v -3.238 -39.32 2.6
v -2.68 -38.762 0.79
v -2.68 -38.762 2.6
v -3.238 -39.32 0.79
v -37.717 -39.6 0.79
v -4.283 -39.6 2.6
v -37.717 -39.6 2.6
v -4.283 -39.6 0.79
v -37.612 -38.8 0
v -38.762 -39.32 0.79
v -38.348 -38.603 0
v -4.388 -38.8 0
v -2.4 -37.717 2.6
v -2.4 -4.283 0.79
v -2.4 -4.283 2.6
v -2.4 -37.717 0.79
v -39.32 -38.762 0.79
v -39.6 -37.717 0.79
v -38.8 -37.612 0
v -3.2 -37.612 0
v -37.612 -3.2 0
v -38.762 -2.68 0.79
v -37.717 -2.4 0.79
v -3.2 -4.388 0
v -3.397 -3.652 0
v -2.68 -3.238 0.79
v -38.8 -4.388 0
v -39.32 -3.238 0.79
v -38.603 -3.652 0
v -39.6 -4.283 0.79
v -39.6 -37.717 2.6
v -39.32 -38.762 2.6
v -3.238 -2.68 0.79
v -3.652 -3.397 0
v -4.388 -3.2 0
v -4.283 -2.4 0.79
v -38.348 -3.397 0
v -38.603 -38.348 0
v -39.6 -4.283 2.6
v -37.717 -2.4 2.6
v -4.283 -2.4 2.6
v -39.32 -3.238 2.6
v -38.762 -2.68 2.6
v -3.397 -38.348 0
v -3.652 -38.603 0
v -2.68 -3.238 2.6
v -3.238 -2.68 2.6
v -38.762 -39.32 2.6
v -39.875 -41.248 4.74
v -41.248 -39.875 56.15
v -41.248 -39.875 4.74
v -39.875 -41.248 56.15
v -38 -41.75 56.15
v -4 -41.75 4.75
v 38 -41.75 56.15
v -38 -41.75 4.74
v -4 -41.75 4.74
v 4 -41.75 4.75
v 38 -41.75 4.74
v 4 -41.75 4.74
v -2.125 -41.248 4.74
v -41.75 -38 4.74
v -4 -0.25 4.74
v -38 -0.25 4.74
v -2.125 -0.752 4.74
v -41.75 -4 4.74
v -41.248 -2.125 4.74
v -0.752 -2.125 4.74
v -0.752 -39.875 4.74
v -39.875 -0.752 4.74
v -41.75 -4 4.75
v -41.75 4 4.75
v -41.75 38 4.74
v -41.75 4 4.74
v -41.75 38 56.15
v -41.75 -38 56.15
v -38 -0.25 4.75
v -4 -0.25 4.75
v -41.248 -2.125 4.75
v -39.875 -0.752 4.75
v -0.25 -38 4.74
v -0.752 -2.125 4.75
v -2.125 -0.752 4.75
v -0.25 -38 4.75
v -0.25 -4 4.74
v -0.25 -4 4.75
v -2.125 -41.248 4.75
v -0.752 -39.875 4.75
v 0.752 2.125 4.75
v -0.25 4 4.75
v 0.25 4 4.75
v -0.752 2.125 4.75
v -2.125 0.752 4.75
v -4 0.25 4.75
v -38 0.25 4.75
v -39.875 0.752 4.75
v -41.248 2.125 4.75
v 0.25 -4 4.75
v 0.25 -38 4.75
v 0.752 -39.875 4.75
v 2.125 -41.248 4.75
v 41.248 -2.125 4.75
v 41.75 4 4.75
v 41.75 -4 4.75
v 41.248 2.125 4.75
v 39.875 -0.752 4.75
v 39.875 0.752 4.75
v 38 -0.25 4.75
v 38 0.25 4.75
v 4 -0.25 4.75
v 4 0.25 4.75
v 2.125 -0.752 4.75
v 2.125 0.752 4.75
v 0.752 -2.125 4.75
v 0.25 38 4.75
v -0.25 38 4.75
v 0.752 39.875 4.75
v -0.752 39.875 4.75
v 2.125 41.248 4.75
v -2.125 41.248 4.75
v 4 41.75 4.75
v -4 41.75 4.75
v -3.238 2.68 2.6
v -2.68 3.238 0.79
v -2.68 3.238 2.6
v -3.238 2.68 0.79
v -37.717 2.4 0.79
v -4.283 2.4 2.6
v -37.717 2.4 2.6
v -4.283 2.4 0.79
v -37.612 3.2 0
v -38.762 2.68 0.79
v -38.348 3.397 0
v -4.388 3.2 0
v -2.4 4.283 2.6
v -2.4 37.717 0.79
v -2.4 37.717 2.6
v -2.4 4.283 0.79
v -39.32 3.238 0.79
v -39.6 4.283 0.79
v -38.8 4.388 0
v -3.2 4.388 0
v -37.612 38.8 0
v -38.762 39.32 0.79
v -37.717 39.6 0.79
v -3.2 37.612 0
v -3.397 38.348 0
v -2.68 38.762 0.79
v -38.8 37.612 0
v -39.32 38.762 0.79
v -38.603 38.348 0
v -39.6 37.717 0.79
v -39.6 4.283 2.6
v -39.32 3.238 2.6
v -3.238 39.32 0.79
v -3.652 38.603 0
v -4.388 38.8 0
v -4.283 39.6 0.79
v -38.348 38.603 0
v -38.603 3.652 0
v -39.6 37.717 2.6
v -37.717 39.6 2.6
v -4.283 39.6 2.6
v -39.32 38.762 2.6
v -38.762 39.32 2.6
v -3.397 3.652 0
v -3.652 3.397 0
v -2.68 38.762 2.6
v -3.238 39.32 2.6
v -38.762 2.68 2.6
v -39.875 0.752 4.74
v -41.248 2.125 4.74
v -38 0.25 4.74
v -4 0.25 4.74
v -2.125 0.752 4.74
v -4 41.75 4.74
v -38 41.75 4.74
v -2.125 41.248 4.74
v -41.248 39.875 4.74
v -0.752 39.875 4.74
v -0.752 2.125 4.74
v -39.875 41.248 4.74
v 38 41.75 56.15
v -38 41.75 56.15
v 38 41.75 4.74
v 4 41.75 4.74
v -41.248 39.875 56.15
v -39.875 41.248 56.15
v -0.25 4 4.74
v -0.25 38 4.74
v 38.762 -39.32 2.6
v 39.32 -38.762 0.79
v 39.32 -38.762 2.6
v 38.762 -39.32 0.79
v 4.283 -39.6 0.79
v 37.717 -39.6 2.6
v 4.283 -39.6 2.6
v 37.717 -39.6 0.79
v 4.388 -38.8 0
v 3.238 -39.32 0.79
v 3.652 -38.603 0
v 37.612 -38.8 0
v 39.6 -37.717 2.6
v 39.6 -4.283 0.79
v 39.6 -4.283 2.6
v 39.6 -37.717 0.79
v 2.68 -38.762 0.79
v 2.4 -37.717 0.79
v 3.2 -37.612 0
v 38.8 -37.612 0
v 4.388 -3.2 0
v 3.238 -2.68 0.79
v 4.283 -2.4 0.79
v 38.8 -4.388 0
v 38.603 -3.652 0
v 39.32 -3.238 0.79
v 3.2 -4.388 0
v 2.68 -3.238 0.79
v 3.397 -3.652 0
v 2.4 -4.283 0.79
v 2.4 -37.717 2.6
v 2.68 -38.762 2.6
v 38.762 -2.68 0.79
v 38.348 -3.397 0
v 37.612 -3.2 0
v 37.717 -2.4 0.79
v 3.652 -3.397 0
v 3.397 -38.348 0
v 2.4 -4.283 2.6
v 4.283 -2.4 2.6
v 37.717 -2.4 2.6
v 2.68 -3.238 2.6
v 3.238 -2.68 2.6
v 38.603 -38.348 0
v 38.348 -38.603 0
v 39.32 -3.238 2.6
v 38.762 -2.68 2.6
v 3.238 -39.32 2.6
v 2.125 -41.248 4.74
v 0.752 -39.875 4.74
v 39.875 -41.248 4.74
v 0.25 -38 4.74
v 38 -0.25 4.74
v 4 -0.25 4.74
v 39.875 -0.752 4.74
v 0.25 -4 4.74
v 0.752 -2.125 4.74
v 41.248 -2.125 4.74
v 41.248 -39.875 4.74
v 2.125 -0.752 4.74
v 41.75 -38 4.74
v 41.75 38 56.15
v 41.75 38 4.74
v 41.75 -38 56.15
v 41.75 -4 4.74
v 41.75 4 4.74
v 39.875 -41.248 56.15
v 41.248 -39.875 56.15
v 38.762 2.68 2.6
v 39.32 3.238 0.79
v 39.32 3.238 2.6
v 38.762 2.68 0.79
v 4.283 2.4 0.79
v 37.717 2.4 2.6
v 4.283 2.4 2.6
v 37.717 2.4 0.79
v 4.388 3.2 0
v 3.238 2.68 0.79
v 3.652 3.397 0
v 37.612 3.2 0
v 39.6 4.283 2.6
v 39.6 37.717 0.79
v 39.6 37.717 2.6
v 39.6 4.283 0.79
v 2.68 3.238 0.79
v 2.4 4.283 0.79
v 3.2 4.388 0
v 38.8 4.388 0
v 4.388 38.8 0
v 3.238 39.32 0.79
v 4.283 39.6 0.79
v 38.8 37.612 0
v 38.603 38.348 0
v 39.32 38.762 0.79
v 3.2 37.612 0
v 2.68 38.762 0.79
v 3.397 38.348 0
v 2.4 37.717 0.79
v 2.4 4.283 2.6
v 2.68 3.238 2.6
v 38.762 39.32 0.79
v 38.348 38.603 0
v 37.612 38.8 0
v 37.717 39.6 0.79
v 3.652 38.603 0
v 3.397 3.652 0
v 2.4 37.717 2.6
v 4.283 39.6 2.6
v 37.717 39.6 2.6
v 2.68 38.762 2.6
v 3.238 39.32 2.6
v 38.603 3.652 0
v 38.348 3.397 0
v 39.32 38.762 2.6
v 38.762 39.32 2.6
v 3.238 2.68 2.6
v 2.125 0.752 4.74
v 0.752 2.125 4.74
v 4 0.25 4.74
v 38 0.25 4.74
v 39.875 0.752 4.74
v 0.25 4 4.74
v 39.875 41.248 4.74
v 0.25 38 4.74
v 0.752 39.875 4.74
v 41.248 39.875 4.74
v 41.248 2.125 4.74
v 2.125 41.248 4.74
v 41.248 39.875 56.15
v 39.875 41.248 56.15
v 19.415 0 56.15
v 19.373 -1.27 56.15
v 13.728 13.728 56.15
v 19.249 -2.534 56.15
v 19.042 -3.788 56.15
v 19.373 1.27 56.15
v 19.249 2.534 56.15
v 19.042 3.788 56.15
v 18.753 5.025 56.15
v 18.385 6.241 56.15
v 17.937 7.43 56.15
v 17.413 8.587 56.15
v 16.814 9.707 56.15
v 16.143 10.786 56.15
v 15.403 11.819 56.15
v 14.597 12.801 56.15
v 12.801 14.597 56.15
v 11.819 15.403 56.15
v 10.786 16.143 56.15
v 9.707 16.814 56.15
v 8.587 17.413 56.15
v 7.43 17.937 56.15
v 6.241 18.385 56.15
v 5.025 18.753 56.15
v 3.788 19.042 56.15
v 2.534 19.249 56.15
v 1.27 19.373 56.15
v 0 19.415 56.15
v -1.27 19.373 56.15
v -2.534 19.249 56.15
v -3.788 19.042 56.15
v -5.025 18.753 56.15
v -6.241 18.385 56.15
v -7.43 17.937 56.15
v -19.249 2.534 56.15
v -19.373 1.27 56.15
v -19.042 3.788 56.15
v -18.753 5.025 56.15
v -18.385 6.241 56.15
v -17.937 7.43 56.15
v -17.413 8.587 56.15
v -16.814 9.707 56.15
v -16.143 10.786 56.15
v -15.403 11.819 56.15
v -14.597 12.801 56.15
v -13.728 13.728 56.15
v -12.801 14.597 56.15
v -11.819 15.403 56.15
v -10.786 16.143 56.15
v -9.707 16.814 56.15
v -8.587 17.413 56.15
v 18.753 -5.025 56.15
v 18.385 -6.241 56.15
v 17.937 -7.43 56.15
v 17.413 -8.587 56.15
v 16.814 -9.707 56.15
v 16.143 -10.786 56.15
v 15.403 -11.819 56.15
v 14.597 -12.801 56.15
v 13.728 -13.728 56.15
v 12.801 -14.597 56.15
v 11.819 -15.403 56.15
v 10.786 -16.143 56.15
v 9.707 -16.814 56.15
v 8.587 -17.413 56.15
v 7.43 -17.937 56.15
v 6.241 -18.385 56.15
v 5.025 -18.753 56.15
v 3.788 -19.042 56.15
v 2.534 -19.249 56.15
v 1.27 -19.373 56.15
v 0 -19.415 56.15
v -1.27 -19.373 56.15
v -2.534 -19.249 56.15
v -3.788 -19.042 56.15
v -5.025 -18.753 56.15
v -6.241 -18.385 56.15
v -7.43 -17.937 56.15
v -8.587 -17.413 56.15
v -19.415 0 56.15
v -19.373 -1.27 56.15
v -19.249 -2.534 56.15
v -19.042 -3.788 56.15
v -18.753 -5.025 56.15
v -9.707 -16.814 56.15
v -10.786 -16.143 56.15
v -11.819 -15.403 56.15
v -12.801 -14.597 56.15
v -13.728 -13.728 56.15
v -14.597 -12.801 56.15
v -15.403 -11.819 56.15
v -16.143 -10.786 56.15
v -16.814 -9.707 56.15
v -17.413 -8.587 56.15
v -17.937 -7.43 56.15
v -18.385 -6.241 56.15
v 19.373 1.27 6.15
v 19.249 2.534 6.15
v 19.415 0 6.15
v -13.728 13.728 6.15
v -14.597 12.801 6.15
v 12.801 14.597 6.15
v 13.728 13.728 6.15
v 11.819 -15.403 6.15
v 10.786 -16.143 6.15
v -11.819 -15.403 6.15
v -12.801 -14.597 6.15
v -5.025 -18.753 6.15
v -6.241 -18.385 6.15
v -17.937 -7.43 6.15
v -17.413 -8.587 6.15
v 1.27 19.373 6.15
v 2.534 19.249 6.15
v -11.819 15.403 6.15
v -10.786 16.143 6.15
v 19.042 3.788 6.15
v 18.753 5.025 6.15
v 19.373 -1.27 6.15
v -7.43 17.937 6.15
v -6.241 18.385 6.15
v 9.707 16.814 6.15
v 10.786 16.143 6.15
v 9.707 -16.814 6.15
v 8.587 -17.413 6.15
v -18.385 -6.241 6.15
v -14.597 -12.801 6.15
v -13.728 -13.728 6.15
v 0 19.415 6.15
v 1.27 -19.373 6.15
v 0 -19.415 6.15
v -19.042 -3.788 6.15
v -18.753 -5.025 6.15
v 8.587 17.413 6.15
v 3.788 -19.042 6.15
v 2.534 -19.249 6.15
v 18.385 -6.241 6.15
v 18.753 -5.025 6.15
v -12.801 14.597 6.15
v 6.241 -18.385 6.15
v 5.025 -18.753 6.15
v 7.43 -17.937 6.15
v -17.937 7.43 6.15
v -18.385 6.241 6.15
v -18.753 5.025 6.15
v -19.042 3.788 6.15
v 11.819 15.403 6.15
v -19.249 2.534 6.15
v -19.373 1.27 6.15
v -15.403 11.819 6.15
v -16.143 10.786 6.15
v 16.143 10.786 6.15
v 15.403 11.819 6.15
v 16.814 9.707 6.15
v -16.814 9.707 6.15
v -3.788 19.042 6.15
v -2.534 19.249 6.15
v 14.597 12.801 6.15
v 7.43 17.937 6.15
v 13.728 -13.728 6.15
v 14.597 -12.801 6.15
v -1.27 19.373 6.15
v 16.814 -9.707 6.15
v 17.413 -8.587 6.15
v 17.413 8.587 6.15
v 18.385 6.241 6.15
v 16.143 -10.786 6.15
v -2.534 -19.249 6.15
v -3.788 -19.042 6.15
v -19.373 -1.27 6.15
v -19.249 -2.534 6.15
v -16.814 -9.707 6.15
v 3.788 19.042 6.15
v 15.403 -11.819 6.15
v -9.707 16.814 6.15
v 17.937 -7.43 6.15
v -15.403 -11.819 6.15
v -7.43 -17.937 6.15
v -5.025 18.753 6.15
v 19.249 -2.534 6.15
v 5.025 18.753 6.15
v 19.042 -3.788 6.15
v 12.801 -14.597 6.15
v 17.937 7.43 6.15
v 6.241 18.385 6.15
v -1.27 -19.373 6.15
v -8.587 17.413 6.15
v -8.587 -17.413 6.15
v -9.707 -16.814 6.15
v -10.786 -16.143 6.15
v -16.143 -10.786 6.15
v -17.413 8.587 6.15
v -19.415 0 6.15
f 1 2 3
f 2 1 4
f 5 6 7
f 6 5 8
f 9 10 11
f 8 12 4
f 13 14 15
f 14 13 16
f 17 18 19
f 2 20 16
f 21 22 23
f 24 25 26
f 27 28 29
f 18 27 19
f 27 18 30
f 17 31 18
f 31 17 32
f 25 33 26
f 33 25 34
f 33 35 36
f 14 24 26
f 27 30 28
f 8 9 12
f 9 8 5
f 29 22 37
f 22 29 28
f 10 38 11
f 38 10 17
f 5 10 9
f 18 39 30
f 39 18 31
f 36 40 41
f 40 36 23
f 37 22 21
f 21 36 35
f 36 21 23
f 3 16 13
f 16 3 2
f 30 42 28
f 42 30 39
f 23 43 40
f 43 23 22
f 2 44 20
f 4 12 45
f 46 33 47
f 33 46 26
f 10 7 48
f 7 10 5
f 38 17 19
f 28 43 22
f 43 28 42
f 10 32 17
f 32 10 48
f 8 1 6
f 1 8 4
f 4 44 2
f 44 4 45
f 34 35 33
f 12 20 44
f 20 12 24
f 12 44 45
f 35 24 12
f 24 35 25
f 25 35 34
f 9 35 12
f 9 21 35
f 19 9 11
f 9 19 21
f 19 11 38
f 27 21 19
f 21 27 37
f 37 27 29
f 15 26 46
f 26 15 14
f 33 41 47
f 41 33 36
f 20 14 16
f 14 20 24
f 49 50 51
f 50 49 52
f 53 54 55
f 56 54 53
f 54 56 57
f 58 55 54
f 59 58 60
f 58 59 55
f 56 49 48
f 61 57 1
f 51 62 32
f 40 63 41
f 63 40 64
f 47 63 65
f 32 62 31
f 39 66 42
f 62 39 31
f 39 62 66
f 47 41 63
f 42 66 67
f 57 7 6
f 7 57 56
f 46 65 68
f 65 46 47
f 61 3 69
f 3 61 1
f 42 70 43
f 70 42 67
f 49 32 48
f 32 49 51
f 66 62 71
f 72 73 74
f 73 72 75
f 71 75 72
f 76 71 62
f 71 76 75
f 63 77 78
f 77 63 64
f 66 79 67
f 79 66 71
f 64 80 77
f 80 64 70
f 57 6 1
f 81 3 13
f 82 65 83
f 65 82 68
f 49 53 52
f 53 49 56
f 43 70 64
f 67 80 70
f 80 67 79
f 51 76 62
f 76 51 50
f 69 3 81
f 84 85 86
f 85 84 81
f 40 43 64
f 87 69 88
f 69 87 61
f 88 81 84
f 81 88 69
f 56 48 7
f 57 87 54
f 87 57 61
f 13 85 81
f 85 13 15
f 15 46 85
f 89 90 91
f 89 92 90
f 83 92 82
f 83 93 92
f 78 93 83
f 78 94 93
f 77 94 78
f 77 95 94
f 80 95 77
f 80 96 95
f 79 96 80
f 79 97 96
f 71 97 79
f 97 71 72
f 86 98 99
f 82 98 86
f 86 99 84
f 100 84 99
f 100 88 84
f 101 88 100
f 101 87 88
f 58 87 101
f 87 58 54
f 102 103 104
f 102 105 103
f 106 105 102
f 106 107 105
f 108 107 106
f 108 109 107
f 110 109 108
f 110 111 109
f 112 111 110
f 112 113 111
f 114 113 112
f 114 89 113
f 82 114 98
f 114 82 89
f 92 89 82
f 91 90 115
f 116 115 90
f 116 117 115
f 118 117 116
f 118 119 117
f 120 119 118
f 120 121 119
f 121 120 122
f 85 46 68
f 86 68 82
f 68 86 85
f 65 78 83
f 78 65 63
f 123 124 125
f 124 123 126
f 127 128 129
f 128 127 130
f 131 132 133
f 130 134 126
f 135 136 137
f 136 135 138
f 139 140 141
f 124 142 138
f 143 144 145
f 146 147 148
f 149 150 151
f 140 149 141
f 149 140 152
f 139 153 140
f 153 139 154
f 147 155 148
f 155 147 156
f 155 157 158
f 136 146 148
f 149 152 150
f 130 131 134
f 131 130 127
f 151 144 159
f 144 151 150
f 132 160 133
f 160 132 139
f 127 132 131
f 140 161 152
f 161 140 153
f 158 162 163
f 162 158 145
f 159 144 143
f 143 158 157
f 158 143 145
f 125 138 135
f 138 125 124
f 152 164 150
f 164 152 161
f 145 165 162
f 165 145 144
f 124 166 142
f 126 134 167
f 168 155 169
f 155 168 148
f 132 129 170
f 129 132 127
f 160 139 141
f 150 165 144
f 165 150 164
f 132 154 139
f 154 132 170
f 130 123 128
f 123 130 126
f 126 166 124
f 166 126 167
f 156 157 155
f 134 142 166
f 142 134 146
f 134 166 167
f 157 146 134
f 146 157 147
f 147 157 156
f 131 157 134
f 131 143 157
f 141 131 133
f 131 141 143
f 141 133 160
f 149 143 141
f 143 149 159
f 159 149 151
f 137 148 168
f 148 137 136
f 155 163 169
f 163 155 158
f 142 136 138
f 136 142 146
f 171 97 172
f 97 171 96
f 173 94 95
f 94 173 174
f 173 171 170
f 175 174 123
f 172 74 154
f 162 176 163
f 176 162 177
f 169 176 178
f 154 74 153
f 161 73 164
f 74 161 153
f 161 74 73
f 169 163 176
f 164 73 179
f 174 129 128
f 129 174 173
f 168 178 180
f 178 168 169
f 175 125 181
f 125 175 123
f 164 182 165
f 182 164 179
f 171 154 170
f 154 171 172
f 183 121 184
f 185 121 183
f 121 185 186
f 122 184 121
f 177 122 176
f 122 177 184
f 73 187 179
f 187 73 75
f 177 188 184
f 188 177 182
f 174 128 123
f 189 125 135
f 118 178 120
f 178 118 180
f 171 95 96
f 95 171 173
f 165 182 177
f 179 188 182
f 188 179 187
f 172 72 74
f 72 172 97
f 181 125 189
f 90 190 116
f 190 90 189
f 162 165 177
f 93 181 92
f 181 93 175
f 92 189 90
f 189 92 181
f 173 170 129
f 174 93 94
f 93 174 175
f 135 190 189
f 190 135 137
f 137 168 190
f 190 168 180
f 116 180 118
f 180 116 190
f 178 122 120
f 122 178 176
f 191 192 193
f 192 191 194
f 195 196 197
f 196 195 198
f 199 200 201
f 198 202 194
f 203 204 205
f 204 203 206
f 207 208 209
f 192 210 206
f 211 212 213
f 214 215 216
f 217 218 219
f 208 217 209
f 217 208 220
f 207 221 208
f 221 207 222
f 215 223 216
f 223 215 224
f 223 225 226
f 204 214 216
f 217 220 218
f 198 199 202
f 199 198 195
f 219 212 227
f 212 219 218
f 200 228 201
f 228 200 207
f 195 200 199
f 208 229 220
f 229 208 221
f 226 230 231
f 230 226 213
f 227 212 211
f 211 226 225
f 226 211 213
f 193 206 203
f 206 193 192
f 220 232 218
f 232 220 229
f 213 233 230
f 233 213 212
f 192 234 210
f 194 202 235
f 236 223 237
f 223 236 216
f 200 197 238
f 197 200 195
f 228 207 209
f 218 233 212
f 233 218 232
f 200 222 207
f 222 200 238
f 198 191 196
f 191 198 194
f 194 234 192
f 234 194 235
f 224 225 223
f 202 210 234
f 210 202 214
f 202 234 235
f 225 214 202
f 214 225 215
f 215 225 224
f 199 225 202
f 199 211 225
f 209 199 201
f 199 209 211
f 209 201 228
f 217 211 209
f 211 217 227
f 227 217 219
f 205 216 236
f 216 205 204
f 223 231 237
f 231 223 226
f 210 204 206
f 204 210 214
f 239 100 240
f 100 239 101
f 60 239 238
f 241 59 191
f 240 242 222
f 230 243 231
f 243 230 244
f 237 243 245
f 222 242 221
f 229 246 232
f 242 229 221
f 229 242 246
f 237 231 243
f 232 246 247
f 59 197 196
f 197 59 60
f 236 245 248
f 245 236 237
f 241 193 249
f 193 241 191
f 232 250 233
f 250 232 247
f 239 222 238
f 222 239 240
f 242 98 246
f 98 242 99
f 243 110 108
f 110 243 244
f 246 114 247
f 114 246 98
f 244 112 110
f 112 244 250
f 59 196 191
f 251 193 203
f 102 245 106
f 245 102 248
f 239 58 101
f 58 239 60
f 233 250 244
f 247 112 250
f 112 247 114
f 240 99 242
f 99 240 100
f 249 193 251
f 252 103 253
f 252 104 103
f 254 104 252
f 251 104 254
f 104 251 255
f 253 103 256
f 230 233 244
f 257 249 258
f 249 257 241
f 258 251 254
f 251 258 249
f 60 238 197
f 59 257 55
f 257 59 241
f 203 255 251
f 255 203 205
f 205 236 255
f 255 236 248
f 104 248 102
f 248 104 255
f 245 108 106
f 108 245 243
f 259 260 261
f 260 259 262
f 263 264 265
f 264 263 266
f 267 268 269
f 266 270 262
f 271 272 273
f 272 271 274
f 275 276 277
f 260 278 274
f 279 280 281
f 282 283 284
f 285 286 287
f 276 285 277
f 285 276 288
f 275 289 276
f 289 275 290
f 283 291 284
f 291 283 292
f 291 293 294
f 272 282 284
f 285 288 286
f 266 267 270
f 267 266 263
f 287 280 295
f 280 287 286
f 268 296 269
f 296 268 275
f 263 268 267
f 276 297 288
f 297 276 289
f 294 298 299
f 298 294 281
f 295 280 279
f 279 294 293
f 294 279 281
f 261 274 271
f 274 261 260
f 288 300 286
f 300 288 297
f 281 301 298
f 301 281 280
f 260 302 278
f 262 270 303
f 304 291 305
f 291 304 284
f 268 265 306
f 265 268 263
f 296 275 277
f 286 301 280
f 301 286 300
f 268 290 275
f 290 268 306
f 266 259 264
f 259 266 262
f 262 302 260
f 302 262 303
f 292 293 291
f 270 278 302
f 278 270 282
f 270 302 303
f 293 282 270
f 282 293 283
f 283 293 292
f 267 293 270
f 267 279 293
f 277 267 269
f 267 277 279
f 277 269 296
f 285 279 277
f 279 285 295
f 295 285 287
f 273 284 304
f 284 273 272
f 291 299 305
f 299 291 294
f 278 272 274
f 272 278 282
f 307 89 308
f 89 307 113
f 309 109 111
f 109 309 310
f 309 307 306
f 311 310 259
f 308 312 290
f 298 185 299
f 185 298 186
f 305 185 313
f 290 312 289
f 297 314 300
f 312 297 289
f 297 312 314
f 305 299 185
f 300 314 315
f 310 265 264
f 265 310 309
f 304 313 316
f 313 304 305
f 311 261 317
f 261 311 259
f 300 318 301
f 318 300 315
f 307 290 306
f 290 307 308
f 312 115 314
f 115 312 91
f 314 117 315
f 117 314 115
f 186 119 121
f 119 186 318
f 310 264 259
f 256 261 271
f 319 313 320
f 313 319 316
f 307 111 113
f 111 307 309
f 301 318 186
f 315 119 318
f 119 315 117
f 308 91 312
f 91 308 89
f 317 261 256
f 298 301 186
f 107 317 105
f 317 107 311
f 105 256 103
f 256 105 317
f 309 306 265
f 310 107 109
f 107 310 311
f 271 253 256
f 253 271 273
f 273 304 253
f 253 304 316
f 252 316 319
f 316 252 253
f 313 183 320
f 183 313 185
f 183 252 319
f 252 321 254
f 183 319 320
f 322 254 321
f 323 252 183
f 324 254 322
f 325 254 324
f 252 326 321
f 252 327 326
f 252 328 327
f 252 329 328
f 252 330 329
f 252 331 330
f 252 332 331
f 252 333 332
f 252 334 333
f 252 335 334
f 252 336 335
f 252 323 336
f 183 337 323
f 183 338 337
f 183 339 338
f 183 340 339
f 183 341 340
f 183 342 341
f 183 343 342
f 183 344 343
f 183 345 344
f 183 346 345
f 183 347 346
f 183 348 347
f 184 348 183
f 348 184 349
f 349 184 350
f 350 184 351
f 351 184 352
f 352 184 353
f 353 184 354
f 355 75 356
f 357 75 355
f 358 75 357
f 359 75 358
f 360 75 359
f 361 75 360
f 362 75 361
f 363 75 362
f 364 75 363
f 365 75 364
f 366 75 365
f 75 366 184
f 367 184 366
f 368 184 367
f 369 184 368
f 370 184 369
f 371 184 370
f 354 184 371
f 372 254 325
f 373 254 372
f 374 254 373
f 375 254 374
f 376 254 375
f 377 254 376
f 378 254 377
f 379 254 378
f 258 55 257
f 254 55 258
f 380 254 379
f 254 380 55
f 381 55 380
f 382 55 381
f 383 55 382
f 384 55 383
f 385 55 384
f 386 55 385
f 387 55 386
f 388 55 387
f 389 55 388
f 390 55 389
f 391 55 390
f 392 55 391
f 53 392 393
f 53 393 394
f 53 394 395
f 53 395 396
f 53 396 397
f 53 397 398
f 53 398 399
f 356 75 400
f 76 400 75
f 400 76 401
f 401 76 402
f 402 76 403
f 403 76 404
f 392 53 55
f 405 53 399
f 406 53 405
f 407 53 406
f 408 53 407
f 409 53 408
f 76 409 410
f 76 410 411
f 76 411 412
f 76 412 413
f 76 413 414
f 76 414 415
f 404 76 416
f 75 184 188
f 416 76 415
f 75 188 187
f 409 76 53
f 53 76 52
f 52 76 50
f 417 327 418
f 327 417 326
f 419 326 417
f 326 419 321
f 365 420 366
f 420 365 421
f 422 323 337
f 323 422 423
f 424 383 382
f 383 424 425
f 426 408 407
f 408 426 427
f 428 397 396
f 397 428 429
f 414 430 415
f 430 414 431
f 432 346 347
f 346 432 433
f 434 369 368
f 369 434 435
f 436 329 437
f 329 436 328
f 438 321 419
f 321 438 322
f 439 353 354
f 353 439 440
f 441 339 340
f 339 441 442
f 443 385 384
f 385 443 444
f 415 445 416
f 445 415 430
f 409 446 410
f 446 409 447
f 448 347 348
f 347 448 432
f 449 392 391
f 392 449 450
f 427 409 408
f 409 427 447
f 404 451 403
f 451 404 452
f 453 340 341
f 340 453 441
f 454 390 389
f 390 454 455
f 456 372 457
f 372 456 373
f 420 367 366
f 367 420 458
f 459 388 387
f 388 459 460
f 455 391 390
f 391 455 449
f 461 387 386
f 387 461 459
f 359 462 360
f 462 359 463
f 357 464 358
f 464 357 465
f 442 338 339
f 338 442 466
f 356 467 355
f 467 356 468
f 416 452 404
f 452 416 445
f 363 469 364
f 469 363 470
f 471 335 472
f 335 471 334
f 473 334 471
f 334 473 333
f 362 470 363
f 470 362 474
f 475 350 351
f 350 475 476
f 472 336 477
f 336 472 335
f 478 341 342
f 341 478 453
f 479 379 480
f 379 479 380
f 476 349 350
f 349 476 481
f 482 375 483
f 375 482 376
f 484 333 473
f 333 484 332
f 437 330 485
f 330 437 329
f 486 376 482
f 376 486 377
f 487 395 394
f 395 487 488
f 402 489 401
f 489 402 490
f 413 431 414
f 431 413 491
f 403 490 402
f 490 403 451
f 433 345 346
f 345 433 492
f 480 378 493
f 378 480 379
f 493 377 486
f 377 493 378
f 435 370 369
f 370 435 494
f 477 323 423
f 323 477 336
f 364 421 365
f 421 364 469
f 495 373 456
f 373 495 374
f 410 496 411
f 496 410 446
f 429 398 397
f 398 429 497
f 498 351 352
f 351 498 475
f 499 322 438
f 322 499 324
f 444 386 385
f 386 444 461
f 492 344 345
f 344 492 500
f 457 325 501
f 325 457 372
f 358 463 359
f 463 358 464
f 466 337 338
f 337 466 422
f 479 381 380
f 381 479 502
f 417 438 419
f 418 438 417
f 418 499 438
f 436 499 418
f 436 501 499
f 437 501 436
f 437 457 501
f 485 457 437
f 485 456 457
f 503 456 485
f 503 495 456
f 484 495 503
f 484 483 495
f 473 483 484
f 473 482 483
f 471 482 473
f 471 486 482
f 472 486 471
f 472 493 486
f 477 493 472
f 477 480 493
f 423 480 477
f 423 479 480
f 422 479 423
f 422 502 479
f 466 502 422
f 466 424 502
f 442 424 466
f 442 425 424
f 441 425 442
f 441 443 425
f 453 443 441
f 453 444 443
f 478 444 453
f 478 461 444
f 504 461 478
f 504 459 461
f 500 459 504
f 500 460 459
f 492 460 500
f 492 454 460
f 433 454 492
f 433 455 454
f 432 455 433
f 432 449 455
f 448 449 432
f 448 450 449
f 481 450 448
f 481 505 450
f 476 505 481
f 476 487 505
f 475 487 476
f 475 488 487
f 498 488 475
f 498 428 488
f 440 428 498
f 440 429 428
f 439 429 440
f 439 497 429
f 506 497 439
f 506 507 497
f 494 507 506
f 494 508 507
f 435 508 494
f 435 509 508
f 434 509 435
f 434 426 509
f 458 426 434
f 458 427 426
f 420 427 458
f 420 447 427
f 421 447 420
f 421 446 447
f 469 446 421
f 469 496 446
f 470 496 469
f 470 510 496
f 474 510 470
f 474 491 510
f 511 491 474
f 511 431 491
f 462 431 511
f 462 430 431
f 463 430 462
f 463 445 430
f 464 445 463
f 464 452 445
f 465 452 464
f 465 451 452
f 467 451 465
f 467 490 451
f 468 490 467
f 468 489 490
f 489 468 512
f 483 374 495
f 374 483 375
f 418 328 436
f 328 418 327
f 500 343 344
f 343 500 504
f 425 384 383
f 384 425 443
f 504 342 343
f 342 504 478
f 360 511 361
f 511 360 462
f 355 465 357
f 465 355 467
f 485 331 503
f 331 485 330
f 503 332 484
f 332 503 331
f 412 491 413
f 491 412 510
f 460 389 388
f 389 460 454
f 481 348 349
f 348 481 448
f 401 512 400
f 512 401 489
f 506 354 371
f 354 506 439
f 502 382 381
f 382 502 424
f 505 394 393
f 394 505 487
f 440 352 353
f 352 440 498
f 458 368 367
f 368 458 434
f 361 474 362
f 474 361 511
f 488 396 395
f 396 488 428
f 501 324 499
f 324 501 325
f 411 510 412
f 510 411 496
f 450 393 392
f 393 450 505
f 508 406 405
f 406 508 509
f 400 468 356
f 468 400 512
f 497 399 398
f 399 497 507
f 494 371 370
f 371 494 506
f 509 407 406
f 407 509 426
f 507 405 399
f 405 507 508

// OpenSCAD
// file: ../lib/gridfinity.scad
// gridfinity.scad — shared Gridfinity baseplate + bin library (per spec).
//
// 42 mm pitch, 41.5 mm bins, baseplate socket 0.7/1.8/2.15 = 4.65 mm, 4 mm
// fillet; bin foot 0.8/1.8/2.15 = 4.75 mm, 3.75 mm corner radius. Verified the
// bin foot seats in the baseplate socket with ~0.25–0.5 mm clearance.
//
//   baseplate(nx, ny)                      — tiled receiving baseplate
//   bin_blank(nx, ny, h)                   — solid bin body (feet + block, no cavity)
//   bin(nx, ny, h, wall, floor)            — open Gridfinity bin
//   divided_bin(nx, ny, h, cols, rows, …)  — bin with internal compartments
//   lid(nx, ny, …)                         — friction lid for a bin of the same footprint
//   stack_base(nx, ny, h, …)               — baseplate-topped base; a bin socket-stacks on it

GF = 42; GF_FILLET = 4;
_C_TOP = 2.15; _C_MID = 1.8; _C_BOT = 0.7;
_BP_LIP = _C_TOP + _C_MID + _C_BOT; _BP_FLOOR = 1.2; BP_H = _BP_LIP + _BP_FLOOR;  // 5.85
BIN_SZ = 41.5; BIN_R = 3.75; BIN_BASE_H = 4.75;

// ---- baseplate ----
module _bp_cell(i = 0) { offset(r = -i) offset(r = GF_FILLET) offset(r = -GF_FILLET) square(GF, center = true); }
module _bp_socket() {
    e = 0.01;
    hull() { translate([0,0,BP_H-e]) linear_extrude(e) _bp_cell(0); translate([0,0,BP_H-_C_TOP]) linear_extrude(e) _bp_cell(_C_TOP); }
    translate([0,0,BP_H-_C_TOP-_C_MID]) linear_extrude(_C_MID) _bp_cell(_C_TOP);
    hull() { translate([0,0,BP_H-_C_TOP-_C_MID-e]) linear_extrude(e) _bp_cell(_C_TOP); translate([0,0,BP_H-_BP_LIP]) linear_extrude(e) _bp_cell(_C_TOP+_C_BOT); }
}
module baseplate(nx, ny) {
    w = nx*GF; d = ny*GF;
    difference() {
        translate([0,0,BP_H/2]) linear_extrude(BP_H, center=true) offset(GF_FILLET) offset(-GF_FILLET) square([w,d], center=true);
        for (ix=[0:nx-1], iy=[0:ny-1]) translate([(ix-(nx-1)/2)*GF, (iy-(ny-1)/2)*GF, 0]) _bp_socket();
    }
}

// ---- bin ----
module _bin_cell(i = 0) { offset(r = -i) offset(r = BIN_R) offset(r = -BIN_R) square(BIN_SZ, center = true); }
module _bin_foot() {
    e = 0.01;
    hull() { linear_extrude(e) _bin_cell(2.95); translate([0,0,0.8]) linear_extrude(e) _bin_cell(2.15); }    // bottom chamfer
    translate([0,0,0.8]) linear_extrude(1.8) _bin_cell(2.15);                                                 // vertical
    hull() { translate([0,0,2.6]) linear_extrude(e) _bin_cell(2.15); translate([0,0,BIN_BASE_H]) linear_extrude(e) _bin_cell(0); } // top chamfer
}
// Solid bin body: Gridfinity feet + the block above them, with no cavity cut.
// Cup-style bins (lib/vessel.scad) subtract their own bores from this instead of
// re-deriving the foot + shell union.
module bin_blank(nx, ny, h) {
    W = nx*GF - 0.5; D = ny*GF - 0.5;
    union() {
        for (ix=[0:nx-1], iy=[0:ny-1]) translate([(ix-(nx-1)/2)*GF, (iy-(ny-1)/2)*GF, 0]) _bin_foot();
        translate([0,0,BIN_BASE_H]) linear_extrude(h-BIN_BASE_H) offset(BIN_R) offset(-BIN_R) square([W,D], center=true);
    }
}

module _bin_shell(nx, ny, h, wall, floor) {
    W = nx*GF - 0.5; D = ny*GF - 0.5;
    difference() {
        bin_blank(nx, ny, h);
        translate([0,0,BIN_BASE_H+floor]) linear_extrude(h) offset(BIN_R-wall) offset(-(BIN_R-wall)) square([W-2*wall, D-2*wall], center=true);
    }
}
module bin(nx, ny, h, wall = 1.2, floor = 1.4) { _bin_shell(nx, ny, h, wall, floor); }

// ---- stacking base ----
// A bin whose TOP is a Gridfinity baseplate, so a standard bin socket-stacks on
// it (two-tier towers: instrument on top, cords/jig/adapters in the base). The
// base is open at the FRONT (−Y) by default so the lower item is reachable while
// the top tier stays socketed — same idea as drybox-splitter-stand's open cubby.
// The whole tower foots on the bench baseplate via this base's own foot.
//
//   h = interior height of the lower compartment (floor to the baseplate cap).
module stack_base(nx, ny, h, wall = 1.2, floor = 1.4, open_front = true) {
    W = nx*GF - 0.5; D = ny*GF - 0.5;
    z0 = BIN_BASE_H + floor;
    iw = W - 2*wall; id = D - 2*wall;
    difference() {
        union() {
            bin_blank(nx, ny, h);                    // solid foot + block to h
            translate([0,0,h]) baseplate(nx, ny);    // baseplate cap (sockets up)
        }
        // lower cavity, floor up to the cap underside
        translate([0,0,z0]) linear_extrude(h - z0 + 0.01)
            offset(BIN_R-wall) offset(-(BIN_R-wall)) square([iw, id], center=true);
        // open front: cut the −Y wall so you reach in under the cap
        if (open_front)
            translate([-iw/2, -D, z0]) cube([iw, D/2 + 0.01, h - z0 + 0.01]);
    }
}

module divided_bin(nx, ny, h, cols = 1, rows = 1, wall = 1.2, floor = 1.4, div = 1.2) {
    W = nx*GF - 0.5; D = ny*GF - 0.5;
    union() {
        bin(nx, ny, h, wall, floor);
        // internal divider walls (from the floor up to the rim)
        iw = W - 2*wall; id = D - 2*wall; z0 = BIN_BASE_H + floor;
        for (c = [1 : cols-1]) translate([-iw/2 + c*iw/cols - div/2, -id/2, z0]) cube([div, id, h - z0]);
        for (r = [1 : rows-1]) translate([-iw/2, -id/2 + r*id/rows - div/2, z0]) cube([iw, div, h - z0]);
    }
}

// ---- lid ----
// Friction lid for a bin of the same footprint: a flat plate with a skirt that
// drops into the bin's cavity. Emitted PRINT-READY — plate on the bed, skirt
// standing up — so it needs no supports. Flip it in your head to picture it
// fitted: the plate then caps the rim and the lid adds `t` to the stack height.
//
// Why lids exist here: full-extension drawer slides let small parts hop between
// compartments on a hard close, and brass inserts aren't magnetic — you can't
// sweep them back. `wall` must match the bin's wall so the skirt lands in the
// cavity; `clearance` is per-side slop between skirt and cavity.
module lid(nx, ny, t = 1.6, skirt = 4, wall = 1.2, clearance = 0.35, lid_wall = 1.6) {
    W = nx*GF - 0.5; D = ny*GF - 0.5;
    iw = W - 2*wall - 2*clearance; id = D - 2*wall - 2*clearance;   // skirt outer
    ir = BIN_R - wall;                                              // cavity corner radius
    union() {
        linear_extrude(t) offset(BIN_R) offset(-BIN_R) square([W, D], center=true);
        translate([0,0,t]) linear_extrude(skirt) difference() {
            offset(ir) offset(-ir) square([iw, id], center=true);
            offset(ir-lid_wall) offset(-(ir-lid_wall)) square([iw-2*lid_wall, id-2*lid_wall], center=true);
        }
    }
}
// file: ../lib/vessel.scad
// vessel.scad — parametric collar cups for bottles, cans, and pen-form tools.
//
// A collar cup is a solid Gridfinity block with cylindrical bores sunk into it.
// It LOCATES a vessel; it does not clamp one. That distinction is the whole
// design: a collar that grips harder than the bin weighs comes out of the
// baseplate with the bottle when you grab it one-handed. Clearance, not
// interference — CLR is per-diameter, not per-side.
//
// Capture depth is roughly a third of the vessel's height. Enough to resist a
// knock (this bench sits under a 180 W fume-extractor intake), not so much that
// you're fishing the bottle out.
//
//   collar_cup(nx, ny, vessel_d, capture_h, …)   — one centred bore
//   collar_cup_multi(nx, ny, bores, capture_h, …) — bores = [[x, y, d], …]
//
// Cord slot: pen-form tools that stand in a cup are usually corded (the HARDELL
// rotary tool takes a barrel jack). Without a slot the lead drapes over the rim
// and levers the tool sideways. `cord_w > 0` cuts a channel from the bore out
// through the wall, open to the top.

include <gridfinity.scad>

CLR      = 1.0;   // bore = vessel_d + CLR. Loose on purpose — see above.
MIN_WALL = 1.2;   // minimum material between two bores, and bore to outer face

// ---- geometry guards ----
// Overlapping bores and bores that break out through the side wall both still
// render as perfectly watertight, 2-manifold meshes — CI cannot tell you the
// part is wrong, only that it is closed. These asserts encode the intent that
// the mesh check can't. Cheap, and they fire at render time rather than on the
// printer.
function _pair_gaps(bores, clr) = [
    for (i = [0 : len(bores)-1], j = [0 : len(bores)-1]) if (i < j)
        norm([bores[i][0]-bores[j][0], bores[i][1]-bores[j][1]])
        - (bores[i][2]+clr)/2 - (bores[j][2]+clr)/2
];
function _edge_gaps(bores, clr, W, D) = [
    for (b = bores) min(W/2 - abs(b[0]) - (b[2]+clr)/2,
                        D/2 - abs(b[1]) - (b[2]+clr)/2)
];

// Multi-bore block. Bores are [x, y, diameter] in mm, relative to the block centre.
module collar_cup_multi(nx, ny, bores, capture_h, floor = 1.4, clr = CLR,
                        cord_w = 0, cord_at = 0, min_wall = MIN_WALL) {
    h = BIN_BASE_H + floor + capture_h;
    e = 0.1;
    W = nx*GF - 0.5; D = ny*GF - 0.5;
    _pg = _pair_gaps(bores, clr);
    _eg = _edge_gaps(bores, clr, W, D);
    assert(len(_pg) == 0 || min(_pg) >= min_wall,
           "collar_cup: bores are too close — they would merge into one pocket");
    assert(min(_eg) >= min_wall,
           "collar_cup: a bore breaches the outer wall — block needs more units");
    difference() {
        bin_blank(nx, ny, h);
        for (b = bores)
            translate([b[0], b[1], BIN_BASE_H + floor])
                cylinder(d = b[2] + clr, h = capture_h + e, $fn = 96);
        // Cord channel: from the first bore outward through the +X wall, open to
        // the rim so the lead drops in from above rather than threading.
        if (cord_w > 0)
            translate([bores[0][0], bores[0][1] - cord_w/2, BIN_BASE_H + floor + cord_at])
                cube([nx*GF, cord_w, h]);
    }
}

// Single centred bore — the common case.
module collar_cup(nx, ny, vessel_d, capture_h, floor = 1.4, clr = CLR,
                  cord_w = 0, cord_at = 0, min_wall = MIN_WALL) {
    collar_cup_multi(nx, ny, [[0, 0, vessel_d]], capture_h, floor, clr,
                     cord_w, cord_at, min_wall);
}

// Evenly spaced row of same-depth bores along X — for a rank of aerosol cans.
// Returns geometry, not a list; pass the diameters and it lays them out on the
// block's centre line.
module collar_cup_row(nx, ny, diameters, capture_h, floor = 1.4, clr = CLR,
                      min_wall = MIN_WALL) {
    n = len(diameters);
    pitch = nx * GF / n;
    collar_cup_multi(nx, ny,
        [for (i = [0 : n-1]) [(i - (n-1)/2) * pitch, 0, diameters[i]]],
        capture_h, floor, clr, 0, 0, min_wall);
}
// main file
// uv_light_holder — TrixHub TH007 365 nm lamp, stored HEAD-DOWN in a 2×2 cup.
// Head ⌀37.83 drops into the bore (self-centres the widest part at the bottom);
// tail + cord + button point up. Head-down also means a bumped-on lamp shines
// into the well, not across the bench — 365 nm is an eye hazard.
include <../lib/vessel.scad>
collar_cup(2, 2, 37.83, 50);
